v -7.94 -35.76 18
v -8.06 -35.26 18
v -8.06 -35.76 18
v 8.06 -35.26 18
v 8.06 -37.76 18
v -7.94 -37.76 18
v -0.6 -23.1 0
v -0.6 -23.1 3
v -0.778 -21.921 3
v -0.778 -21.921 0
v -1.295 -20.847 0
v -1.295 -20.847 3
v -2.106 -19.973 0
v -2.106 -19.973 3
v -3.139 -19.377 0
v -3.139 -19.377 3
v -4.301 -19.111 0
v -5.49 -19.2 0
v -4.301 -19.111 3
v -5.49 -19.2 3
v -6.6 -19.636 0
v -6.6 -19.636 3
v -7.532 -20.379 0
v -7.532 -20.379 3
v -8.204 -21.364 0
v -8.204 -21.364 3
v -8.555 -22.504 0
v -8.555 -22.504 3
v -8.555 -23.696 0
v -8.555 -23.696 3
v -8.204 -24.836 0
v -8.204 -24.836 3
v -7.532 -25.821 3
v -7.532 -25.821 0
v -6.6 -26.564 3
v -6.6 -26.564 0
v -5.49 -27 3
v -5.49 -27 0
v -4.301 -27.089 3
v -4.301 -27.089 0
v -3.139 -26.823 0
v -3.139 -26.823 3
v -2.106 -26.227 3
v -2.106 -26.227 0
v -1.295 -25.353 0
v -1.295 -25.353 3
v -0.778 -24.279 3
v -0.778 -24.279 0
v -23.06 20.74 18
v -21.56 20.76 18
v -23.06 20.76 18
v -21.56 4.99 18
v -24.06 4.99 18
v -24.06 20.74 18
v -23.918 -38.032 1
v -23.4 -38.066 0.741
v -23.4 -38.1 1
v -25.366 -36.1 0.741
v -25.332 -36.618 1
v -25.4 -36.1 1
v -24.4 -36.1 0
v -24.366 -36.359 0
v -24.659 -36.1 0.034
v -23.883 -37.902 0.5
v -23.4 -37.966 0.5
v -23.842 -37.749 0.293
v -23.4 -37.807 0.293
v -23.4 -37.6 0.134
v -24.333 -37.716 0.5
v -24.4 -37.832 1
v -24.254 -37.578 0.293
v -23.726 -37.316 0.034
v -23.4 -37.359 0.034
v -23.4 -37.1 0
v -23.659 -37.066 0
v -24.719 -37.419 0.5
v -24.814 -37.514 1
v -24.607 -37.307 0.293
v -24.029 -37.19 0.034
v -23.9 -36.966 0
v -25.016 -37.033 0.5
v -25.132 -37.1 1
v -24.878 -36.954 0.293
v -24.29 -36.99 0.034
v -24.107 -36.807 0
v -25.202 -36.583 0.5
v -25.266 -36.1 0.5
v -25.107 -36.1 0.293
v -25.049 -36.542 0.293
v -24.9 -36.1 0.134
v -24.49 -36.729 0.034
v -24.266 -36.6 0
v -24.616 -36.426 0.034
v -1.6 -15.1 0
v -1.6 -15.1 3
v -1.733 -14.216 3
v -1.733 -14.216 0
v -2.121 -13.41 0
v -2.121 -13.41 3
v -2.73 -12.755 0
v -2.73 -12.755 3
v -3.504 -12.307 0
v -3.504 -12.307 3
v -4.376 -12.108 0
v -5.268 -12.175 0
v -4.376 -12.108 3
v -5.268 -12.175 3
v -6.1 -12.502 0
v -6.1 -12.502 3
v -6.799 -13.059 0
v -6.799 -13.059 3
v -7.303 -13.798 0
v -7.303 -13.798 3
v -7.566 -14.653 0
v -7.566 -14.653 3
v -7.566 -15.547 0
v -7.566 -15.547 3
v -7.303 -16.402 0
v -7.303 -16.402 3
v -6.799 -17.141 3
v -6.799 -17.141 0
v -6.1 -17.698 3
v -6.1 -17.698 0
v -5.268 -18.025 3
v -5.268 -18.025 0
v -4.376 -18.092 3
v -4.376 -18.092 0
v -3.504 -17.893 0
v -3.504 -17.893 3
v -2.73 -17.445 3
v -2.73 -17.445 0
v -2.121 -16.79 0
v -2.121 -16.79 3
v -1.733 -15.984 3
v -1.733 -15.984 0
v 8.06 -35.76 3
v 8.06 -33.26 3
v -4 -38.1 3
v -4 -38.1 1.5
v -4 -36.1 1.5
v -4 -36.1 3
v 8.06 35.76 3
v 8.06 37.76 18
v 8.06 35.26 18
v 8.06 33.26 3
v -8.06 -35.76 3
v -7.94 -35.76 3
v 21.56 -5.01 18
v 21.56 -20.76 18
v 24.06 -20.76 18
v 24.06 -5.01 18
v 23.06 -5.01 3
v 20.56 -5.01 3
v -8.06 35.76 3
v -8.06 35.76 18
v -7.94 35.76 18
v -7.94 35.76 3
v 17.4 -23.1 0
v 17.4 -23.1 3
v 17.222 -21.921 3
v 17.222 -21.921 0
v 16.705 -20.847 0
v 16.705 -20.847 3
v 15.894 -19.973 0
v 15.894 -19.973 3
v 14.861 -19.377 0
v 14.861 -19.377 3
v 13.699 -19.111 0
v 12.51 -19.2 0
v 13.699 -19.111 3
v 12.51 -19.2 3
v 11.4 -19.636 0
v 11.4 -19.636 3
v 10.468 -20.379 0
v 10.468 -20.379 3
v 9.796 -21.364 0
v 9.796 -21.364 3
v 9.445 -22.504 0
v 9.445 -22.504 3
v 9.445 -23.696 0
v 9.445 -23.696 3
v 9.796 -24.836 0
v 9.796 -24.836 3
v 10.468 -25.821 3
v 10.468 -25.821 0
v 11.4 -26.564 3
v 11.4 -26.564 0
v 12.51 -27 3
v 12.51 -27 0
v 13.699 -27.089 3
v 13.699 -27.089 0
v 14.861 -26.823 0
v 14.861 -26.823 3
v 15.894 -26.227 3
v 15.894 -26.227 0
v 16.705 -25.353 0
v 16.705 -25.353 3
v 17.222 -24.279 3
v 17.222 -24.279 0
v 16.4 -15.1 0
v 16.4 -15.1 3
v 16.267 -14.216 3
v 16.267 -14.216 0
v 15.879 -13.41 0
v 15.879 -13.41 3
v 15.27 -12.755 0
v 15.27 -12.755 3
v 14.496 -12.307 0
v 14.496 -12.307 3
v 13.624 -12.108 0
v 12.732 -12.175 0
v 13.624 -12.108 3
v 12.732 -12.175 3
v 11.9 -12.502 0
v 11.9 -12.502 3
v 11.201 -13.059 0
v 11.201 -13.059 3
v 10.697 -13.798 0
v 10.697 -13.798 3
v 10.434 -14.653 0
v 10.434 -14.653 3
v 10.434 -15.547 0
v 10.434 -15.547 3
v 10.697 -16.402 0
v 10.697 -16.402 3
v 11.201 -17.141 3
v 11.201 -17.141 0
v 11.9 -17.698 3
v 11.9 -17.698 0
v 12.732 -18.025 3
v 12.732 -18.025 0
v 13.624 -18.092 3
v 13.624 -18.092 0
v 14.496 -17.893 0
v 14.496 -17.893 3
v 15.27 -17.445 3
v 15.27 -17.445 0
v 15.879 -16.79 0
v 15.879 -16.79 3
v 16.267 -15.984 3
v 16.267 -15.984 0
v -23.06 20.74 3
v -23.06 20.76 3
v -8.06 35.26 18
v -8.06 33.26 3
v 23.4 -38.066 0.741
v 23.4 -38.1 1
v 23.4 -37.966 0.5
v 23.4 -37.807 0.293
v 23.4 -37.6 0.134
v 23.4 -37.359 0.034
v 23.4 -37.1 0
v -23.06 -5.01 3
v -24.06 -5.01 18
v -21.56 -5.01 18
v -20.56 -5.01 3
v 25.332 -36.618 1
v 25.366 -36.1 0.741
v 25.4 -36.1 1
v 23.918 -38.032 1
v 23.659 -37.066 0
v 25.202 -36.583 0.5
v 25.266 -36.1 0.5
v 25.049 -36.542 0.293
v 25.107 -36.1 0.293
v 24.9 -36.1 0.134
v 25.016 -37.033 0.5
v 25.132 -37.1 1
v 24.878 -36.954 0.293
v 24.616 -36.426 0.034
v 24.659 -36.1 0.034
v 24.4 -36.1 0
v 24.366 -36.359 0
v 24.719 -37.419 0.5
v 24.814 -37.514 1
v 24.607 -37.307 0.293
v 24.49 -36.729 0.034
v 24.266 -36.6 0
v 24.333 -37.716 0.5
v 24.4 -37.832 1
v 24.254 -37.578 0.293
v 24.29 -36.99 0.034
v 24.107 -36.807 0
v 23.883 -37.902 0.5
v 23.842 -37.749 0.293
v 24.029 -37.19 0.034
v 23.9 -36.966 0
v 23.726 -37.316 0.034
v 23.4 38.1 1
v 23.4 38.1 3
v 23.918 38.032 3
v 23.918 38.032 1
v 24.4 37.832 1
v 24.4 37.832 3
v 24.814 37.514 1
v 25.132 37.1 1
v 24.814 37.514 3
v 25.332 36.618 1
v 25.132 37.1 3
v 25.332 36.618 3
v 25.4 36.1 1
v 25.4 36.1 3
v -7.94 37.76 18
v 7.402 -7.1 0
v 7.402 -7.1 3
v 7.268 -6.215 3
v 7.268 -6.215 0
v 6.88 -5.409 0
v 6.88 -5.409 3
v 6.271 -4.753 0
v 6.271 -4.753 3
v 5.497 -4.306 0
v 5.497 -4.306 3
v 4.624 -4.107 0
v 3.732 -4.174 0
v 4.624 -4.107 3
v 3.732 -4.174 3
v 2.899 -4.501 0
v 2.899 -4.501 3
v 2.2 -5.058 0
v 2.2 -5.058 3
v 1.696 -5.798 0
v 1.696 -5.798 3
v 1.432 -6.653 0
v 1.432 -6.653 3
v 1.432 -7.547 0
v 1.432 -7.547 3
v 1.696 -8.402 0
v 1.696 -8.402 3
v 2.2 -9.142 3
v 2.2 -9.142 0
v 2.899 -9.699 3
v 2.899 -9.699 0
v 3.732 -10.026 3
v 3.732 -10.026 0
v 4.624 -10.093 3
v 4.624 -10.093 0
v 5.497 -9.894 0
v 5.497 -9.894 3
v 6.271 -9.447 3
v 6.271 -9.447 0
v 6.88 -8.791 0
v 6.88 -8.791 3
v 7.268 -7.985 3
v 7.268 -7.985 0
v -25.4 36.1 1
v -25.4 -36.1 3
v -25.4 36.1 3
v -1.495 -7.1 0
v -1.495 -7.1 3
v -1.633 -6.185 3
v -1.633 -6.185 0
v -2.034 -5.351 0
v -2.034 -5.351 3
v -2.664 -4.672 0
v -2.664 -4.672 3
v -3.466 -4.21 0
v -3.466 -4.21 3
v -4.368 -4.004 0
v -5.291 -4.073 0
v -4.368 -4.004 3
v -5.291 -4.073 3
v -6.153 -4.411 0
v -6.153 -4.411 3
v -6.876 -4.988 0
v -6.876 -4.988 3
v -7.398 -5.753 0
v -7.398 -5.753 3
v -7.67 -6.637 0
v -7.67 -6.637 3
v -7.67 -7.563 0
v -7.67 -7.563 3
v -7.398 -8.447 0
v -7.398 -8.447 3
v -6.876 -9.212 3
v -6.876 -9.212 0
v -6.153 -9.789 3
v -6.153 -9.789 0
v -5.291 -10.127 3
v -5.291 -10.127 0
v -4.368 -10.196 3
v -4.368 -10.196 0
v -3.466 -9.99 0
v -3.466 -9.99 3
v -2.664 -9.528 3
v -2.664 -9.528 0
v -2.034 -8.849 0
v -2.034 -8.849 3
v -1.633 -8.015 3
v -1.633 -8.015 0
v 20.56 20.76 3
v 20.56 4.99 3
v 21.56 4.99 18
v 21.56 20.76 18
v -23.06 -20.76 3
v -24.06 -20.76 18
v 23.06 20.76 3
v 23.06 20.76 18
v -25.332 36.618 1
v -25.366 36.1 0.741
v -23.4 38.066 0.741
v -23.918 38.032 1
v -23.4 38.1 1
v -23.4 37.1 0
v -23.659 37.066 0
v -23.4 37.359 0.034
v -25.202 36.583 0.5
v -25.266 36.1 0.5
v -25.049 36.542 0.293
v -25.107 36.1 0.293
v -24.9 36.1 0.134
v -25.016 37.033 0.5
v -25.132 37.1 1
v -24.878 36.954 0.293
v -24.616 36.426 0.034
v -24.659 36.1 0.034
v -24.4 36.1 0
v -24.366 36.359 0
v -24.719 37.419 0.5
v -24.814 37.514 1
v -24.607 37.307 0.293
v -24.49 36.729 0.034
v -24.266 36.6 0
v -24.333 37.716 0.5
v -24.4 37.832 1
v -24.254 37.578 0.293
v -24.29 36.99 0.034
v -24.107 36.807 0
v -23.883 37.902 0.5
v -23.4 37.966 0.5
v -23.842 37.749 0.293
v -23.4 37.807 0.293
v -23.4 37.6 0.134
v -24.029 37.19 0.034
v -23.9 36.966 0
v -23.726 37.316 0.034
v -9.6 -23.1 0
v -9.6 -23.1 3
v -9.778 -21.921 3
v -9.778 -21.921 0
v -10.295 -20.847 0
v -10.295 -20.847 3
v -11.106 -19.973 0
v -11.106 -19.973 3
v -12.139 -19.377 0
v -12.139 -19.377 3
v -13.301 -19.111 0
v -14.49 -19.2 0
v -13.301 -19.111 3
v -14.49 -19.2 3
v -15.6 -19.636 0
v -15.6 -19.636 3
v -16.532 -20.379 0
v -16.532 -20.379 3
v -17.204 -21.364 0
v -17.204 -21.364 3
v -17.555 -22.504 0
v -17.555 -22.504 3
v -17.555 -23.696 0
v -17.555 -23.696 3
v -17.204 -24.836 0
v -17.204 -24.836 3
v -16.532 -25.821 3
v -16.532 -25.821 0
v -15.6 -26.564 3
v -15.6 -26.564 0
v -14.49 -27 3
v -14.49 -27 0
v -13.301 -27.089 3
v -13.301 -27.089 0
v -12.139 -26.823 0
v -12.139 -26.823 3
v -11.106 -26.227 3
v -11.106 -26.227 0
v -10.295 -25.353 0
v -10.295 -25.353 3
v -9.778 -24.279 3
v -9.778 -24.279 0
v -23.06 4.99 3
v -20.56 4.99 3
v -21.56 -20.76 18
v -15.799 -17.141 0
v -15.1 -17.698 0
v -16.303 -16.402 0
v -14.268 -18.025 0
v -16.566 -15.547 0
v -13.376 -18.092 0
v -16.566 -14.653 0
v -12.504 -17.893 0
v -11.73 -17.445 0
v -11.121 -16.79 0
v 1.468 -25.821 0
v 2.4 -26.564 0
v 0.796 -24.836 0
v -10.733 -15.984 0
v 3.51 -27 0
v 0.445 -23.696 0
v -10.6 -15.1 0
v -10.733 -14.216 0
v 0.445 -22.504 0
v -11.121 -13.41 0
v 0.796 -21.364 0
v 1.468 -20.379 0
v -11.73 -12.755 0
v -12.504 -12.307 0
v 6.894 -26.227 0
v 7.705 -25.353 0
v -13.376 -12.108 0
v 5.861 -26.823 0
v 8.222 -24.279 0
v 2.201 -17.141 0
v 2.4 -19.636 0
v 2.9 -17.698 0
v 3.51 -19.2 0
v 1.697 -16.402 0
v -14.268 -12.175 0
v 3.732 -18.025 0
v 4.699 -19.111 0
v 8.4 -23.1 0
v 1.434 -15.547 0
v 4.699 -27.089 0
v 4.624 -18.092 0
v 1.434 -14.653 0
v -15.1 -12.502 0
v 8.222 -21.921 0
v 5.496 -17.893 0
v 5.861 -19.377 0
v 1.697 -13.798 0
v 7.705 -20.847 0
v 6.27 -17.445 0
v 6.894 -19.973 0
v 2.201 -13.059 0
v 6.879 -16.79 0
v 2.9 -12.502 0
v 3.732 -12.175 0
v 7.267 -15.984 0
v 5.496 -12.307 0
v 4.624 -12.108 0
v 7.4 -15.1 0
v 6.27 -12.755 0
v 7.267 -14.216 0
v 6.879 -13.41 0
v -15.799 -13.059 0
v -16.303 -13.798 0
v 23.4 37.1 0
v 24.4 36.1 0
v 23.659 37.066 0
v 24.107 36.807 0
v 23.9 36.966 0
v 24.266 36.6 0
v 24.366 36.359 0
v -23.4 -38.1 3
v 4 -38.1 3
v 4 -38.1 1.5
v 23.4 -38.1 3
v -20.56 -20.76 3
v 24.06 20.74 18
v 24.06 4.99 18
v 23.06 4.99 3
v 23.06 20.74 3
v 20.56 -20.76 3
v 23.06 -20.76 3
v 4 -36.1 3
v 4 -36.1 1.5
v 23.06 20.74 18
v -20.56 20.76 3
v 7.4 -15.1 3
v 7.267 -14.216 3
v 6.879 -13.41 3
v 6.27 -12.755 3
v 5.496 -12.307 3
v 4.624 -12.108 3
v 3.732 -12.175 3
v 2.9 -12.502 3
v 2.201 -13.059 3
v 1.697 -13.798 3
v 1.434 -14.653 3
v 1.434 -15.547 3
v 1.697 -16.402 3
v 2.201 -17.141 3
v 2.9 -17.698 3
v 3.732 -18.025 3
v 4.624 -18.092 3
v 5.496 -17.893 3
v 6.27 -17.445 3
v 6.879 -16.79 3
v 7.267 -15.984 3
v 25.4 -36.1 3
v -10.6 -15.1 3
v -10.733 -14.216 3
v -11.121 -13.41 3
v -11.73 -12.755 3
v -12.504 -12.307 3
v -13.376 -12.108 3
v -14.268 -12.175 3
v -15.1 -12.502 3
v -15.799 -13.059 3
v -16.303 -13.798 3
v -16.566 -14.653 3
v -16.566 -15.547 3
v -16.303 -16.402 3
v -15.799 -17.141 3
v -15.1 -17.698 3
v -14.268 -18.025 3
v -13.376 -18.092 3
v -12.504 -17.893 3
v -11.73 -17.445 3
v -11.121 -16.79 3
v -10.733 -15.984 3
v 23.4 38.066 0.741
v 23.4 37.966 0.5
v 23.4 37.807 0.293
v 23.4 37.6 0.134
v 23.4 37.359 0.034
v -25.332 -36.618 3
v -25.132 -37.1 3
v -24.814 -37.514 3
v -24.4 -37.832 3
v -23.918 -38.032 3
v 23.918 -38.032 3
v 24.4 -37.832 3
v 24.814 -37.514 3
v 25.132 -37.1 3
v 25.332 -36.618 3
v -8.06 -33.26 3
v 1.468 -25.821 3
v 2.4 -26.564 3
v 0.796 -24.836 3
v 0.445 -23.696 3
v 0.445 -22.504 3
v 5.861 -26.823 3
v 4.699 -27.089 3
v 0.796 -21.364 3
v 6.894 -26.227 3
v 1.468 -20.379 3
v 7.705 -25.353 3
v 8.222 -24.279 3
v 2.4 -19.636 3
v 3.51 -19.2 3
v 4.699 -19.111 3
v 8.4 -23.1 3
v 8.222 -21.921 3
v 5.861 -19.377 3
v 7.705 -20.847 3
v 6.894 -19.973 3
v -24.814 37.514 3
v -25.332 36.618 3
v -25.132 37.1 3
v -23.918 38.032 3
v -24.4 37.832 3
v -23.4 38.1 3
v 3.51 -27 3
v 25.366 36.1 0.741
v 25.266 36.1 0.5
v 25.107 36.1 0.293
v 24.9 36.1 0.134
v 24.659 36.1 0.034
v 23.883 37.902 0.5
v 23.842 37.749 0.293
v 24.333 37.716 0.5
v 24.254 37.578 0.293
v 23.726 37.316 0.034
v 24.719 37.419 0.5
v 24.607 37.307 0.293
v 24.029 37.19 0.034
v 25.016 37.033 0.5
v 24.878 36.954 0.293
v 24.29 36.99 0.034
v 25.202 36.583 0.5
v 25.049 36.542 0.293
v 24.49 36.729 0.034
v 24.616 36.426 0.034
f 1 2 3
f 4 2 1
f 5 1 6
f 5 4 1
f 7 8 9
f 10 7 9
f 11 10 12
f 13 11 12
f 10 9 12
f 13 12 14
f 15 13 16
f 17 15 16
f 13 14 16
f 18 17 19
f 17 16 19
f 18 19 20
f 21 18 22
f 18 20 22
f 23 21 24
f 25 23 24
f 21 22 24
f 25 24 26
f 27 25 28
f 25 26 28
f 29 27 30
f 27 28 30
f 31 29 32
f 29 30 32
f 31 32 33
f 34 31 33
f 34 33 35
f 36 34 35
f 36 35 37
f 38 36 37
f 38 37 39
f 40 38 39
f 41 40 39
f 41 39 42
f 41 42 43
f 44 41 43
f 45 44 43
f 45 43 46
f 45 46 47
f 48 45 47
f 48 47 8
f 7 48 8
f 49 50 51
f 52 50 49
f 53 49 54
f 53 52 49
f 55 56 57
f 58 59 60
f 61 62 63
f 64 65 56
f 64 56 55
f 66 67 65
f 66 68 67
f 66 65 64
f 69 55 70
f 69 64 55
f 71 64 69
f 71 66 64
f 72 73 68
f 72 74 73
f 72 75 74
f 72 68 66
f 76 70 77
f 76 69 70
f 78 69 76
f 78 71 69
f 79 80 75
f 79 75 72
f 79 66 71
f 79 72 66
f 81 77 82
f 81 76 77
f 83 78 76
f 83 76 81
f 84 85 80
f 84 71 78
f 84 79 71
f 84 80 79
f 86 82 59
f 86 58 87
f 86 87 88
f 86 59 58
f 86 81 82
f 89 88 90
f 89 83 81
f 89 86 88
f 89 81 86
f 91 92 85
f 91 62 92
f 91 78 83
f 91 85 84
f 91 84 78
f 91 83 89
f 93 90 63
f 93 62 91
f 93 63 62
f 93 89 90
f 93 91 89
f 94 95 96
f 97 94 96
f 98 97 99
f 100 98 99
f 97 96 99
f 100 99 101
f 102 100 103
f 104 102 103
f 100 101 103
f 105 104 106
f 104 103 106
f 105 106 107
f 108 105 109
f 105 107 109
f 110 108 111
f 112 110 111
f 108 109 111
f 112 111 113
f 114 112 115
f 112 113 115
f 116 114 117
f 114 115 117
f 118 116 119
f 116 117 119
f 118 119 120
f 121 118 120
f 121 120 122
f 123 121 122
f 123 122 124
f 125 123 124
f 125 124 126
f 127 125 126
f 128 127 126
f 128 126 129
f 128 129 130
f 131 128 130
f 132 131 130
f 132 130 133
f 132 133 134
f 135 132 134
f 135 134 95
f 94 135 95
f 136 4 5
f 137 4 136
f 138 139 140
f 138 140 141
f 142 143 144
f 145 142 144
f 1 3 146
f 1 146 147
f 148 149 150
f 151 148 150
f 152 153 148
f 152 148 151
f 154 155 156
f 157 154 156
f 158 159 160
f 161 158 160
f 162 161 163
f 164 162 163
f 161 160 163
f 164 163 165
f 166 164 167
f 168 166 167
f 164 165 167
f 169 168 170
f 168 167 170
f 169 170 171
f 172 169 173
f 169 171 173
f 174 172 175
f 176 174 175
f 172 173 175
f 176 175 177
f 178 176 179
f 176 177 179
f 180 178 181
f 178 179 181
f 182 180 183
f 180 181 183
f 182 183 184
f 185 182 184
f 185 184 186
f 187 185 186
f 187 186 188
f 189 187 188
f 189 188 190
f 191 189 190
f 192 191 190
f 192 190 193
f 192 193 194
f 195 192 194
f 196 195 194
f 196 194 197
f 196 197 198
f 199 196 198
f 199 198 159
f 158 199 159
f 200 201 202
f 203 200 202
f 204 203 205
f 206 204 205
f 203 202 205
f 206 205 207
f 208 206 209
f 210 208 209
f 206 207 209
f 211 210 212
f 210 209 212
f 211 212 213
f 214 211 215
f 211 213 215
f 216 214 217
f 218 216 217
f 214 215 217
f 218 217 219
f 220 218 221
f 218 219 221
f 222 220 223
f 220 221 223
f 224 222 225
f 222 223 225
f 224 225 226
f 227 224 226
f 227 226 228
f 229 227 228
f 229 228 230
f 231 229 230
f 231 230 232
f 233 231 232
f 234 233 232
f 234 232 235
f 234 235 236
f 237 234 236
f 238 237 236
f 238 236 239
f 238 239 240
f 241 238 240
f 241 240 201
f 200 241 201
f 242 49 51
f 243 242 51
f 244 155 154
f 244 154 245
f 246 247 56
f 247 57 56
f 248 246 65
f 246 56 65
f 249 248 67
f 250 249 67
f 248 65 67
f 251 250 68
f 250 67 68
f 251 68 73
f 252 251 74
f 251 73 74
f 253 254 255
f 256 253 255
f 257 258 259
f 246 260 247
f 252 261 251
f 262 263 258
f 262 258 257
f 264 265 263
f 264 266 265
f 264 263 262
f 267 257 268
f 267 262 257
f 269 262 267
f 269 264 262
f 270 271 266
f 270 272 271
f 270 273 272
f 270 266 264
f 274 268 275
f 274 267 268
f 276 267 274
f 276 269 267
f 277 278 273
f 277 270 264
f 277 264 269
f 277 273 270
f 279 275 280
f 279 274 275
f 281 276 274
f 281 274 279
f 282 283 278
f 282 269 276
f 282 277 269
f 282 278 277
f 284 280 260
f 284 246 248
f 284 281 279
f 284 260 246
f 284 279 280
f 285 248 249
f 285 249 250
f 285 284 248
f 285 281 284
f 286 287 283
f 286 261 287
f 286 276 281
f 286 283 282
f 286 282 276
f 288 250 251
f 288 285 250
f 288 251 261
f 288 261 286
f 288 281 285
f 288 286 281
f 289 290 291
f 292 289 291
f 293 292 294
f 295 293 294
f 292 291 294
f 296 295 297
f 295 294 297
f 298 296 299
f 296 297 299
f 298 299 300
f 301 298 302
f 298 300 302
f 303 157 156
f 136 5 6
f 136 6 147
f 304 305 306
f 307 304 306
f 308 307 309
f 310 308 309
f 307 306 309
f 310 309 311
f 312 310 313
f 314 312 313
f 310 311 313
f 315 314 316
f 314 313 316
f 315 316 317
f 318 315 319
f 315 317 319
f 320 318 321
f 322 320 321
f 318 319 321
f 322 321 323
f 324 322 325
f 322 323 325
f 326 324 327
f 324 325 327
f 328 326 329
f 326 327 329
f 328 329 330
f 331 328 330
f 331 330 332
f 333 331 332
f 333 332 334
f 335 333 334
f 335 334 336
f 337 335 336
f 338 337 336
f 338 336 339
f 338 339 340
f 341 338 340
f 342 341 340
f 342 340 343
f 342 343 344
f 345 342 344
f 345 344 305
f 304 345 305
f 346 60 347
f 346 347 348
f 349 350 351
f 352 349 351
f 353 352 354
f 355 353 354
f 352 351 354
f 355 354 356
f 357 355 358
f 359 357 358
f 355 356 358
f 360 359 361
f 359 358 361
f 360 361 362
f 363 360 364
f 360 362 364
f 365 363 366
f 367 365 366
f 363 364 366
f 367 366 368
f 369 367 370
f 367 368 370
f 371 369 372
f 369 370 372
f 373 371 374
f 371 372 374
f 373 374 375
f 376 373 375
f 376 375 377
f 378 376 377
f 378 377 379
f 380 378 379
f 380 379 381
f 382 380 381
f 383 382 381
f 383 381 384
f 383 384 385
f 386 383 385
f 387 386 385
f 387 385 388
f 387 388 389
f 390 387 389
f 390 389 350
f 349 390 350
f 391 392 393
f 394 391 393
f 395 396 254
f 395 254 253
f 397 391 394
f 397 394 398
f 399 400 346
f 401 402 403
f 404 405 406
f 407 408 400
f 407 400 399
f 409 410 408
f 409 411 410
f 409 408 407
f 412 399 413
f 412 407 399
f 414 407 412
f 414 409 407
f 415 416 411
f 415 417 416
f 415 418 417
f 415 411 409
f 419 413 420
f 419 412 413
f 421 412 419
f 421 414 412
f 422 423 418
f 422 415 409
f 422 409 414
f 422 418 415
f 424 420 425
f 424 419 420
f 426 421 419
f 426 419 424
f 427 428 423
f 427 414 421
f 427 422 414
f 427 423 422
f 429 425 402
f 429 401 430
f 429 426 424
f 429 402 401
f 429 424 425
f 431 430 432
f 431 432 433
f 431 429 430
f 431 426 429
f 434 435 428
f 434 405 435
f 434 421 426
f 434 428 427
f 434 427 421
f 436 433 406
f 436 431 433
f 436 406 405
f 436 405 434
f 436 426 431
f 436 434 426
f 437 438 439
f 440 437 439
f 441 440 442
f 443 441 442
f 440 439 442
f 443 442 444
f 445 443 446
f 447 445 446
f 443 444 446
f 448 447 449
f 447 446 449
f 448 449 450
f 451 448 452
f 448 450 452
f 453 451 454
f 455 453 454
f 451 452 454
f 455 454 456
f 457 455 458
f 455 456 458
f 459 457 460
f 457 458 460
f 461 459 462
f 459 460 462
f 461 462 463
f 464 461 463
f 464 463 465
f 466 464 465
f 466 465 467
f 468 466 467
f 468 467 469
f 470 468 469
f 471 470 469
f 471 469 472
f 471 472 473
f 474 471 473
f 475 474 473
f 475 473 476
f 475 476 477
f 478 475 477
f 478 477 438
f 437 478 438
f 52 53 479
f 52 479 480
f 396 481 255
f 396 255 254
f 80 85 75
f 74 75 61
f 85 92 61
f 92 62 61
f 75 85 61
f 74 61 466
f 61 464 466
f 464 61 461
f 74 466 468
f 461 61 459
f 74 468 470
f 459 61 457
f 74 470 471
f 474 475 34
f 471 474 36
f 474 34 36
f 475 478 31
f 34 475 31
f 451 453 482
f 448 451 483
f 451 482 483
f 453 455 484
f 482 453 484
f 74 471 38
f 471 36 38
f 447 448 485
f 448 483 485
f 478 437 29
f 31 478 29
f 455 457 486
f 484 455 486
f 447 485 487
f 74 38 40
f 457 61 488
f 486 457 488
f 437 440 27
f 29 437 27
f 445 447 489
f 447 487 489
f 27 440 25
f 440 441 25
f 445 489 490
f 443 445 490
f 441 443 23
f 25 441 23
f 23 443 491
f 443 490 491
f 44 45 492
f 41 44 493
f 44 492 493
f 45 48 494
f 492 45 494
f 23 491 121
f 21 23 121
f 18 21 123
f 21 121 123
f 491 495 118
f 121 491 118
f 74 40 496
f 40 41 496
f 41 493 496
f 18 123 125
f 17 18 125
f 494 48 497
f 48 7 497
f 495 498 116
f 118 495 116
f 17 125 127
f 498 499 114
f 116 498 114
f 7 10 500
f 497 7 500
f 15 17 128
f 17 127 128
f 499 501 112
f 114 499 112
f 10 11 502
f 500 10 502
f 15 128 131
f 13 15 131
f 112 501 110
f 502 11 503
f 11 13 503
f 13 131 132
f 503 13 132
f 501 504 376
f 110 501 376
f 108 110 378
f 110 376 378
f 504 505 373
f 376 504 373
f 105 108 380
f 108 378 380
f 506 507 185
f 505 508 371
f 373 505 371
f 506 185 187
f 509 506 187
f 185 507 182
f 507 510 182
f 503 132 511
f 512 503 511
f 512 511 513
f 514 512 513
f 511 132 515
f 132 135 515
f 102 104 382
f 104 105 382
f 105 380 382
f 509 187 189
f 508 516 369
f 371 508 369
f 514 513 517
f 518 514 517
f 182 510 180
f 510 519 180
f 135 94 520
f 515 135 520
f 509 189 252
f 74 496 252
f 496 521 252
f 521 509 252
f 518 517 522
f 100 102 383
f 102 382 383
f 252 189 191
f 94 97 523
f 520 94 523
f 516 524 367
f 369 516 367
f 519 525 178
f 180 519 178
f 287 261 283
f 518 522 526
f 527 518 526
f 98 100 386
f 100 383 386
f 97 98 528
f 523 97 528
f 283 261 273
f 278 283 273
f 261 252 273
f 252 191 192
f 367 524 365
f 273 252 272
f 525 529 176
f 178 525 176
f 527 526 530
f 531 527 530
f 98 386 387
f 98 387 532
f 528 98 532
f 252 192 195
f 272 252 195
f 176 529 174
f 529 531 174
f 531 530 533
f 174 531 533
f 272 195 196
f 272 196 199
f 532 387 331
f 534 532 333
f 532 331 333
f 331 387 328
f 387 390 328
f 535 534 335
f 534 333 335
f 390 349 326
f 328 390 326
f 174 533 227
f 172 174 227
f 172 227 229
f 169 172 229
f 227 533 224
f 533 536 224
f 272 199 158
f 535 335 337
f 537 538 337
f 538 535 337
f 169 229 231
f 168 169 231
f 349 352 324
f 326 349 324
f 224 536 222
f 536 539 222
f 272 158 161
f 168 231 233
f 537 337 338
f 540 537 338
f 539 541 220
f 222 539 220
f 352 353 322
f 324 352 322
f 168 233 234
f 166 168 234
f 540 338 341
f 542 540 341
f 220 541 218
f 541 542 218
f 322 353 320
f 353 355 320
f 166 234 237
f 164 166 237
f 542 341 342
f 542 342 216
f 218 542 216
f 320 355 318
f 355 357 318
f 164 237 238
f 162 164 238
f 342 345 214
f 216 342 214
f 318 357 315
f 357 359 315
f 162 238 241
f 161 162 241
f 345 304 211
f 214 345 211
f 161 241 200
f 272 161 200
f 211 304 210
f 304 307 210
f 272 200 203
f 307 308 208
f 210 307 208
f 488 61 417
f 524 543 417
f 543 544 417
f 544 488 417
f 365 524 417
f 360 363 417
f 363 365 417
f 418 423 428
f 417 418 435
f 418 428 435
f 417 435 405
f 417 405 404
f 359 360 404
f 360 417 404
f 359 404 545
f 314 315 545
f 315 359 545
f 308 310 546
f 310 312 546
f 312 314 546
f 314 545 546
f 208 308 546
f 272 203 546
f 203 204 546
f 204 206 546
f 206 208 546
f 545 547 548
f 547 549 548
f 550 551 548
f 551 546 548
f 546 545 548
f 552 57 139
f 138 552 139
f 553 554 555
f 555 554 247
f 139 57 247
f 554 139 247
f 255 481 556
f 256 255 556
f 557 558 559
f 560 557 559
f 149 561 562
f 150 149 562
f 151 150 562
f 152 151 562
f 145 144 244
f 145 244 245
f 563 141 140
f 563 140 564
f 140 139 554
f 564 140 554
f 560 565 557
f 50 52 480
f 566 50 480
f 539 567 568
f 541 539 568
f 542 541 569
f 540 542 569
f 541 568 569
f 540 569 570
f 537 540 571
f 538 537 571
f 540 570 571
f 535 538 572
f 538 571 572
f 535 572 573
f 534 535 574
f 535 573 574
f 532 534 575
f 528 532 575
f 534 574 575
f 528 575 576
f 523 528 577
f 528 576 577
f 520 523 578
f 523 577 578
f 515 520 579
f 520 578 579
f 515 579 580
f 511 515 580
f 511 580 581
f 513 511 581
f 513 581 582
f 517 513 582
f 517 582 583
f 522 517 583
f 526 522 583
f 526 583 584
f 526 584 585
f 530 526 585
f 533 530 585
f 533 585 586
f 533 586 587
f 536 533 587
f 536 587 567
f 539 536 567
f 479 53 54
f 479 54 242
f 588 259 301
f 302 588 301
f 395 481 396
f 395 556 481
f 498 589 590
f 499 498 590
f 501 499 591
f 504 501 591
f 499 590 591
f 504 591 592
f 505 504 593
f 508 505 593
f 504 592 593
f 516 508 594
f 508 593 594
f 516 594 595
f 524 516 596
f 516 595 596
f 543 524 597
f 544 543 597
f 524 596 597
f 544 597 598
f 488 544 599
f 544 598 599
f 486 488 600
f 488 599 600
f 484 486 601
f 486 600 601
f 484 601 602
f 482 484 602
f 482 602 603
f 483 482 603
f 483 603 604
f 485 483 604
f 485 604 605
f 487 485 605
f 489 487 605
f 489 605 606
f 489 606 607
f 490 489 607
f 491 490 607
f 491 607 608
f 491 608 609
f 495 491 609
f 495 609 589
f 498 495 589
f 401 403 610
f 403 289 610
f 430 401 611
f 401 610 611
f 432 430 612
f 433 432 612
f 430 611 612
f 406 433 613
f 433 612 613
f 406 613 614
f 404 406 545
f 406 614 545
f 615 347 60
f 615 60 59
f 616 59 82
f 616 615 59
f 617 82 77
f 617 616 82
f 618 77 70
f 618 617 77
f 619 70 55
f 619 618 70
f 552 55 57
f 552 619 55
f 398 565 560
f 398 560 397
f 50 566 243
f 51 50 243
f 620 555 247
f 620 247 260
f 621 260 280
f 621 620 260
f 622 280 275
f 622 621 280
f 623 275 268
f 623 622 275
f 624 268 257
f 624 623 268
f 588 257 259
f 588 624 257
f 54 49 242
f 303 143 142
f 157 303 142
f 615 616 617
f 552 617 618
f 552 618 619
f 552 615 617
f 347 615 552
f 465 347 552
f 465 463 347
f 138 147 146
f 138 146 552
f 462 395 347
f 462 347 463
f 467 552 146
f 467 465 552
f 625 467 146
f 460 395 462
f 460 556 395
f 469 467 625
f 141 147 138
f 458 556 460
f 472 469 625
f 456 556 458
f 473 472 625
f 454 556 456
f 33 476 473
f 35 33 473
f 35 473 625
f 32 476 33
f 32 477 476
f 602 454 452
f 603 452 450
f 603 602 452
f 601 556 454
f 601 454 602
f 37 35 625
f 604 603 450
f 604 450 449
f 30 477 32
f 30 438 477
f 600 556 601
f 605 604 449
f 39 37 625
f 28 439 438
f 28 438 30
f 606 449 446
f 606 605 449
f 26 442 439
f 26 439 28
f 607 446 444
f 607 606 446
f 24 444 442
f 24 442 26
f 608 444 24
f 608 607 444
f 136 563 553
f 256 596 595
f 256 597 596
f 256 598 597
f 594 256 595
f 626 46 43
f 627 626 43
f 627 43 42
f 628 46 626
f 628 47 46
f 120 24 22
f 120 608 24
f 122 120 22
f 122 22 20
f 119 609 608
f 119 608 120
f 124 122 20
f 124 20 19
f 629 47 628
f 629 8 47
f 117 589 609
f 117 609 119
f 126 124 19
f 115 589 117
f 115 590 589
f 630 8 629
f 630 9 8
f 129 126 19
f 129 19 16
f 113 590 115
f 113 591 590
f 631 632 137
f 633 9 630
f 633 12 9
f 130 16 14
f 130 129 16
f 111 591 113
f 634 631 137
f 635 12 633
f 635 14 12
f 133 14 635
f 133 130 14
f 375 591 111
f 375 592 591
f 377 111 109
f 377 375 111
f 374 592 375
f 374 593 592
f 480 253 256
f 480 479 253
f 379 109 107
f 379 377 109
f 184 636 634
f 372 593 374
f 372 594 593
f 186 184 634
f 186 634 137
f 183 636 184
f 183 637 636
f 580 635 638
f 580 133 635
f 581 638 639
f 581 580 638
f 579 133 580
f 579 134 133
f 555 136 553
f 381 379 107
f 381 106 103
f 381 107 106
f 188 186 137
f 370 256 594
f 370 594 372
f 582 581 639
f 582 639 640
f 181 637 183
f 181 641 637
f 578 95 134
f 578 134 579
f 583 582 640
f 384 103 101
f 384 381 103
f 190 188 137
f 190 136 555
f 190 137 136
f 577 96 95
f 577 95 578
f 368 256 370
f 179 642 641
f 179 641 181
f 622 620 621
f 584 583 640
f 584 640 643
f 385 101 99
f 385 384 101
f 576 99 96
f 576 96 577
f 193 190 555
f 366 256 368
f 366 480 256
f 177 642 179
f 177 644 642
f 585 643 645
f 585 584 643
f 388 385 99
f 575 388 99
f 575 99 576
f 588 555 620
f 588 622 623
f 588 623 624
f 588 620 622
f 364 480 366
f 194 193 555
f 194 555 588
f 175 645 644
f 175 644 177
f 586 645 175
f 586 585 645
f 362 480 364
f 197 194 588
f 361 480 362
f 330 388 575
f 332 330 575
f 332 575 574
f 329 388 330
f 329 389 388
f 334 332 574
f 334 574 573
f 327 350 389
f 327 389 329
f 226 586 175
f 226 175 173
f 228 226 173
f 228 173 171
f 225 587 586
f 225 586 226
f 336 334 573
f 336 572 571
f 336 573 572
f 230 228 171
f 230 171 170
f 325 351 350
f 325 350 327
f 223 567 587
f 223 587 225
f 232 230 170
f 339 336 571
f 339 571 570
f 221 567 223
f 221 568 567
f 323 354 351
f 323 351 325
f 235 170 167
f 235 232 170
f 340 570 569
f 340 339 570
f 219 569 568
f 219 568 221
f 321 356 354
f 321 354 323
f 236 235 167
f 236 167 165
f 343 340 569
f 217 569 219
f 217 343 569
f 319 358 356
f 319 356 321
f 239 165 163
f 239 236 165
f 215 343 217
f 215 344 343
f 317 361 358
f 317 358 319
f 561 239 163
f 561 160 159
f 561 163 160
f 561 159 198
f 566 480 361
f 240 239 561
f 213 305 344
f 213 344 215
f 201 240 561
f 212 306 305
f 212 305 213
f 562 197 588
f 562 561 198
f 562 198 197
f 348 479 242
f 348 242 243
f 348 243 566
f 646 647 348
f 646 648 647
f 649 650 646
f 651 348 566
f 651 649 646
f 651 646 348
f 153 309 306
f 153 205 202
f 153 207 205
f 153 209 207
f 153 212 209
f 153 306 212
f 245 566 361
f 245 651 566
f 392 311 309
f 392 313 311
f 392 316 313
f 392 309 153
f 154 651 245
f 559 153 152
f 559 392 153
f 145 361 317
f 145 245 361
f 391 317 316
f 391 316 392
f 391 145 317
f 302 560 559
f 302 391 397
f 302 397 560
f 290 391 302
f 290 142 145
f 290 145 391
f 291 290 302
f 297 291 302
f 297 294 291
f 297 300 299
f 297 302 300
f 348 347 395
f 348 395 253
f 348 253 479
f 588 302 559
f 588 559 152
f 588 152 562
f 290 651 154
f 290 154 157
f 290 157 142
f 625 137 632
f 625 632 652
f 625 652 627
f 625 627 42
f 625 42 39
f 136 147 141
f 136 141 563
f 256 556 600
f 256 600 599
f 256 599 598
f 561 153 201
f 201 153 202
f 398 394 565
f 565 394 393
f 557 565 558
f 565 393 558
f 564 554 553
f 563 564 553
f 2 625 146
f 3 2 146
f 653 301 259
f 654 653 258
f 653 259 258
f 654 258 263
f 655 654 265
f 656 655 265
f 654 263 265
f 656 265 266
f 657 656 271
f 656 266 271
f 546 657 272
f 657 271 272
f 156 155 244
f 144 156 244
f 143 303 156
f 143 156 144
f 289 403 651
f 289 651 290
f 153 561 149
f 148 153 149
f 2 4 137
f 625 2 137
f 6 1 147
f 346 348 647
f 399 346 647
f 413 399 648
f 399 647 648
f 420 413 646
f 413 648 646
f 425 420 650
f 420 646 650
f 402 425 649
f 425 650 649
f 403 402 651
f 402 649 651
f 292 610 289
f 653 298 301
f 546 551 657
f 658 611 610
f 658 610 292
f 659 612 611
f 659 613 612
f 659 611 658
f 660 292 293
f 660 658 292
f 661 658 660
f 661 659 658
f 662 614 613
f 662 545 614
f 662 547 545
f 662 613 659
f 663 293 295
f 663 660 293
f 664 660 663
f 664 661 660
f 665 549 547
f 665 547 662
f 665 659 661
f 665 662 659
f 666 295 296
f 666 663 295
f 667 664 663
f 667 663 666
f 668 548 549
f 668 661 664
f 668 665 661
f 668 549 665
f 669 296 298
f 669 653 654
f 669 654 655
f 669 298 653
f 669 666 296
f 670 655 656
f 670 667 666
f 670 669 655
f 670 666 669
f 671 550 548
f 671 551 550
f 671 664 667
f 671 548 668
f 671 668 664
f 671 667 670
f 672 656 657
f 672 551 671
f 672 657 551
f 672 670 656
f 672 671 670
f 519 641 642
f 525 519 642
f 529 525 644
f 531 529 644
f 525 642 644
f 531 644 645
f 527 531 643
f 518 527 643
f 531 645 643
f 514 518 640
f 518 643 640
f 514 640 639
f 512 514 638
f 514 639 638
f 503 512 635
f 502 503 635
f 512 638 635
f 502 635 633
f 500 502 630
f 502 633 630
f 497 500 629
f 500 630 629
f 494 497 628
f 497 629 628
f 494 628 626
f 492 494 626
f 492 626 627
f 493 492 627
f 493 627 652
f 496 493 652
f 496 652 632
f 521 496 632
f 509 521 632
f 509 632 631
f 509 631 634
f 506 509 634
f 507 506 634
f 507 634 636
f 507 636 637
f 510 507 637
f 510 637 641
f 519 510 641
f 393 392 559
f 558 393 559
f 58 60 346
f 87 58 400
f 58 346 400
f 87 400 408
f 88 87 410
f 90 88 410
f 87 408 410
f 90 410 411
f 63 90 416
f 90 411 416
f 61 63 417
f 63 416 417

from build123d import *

# Parameters (mm, degrees)
CROQUIS1_W              = 50.8
CROQUIS1_H              = 76.2
SALIENTE_EXTRUIR1_DEPTH = 18
CROQUIS2_W              = 50.8
CROQUIS2_H              = 76.2
CROQUIS2_W_2            = 46.12
CROQUIS2_H_2            = 71.52
CROQUIS2_W_3            = 38.8
CROQUIS2_H_3            = 64.2
CORTAR_EXTRUIR1_DEPTH   = 15
CORTAR_EXTRUIR8_DEPTH   = 15
SALIENTE_EXTRUIR3_DEPTH = 41.5
CORTAR_EXTRUIR9_DEPTH   = 51.5
CORTAR_EXTRUIR10_DEPTH  = 51.5
SALIENTE_EXTRUIR4_DEPTH = 16
CORTAR_EXTRUIR11_DEPTH  = 16.5
REDONDEO3_R             = 2
REDONDEO4_R             = 1
CROQUIS15_W             = 48.12
CROQUIS15_H             = 10
CORTAR_EXTRUIR12_DEPTH  = 15
CROQUIS16_W             = 8
CROQUIS16_H             = 1.5
CORTAR_EXTRUIR13_DEPTH  = 2
CROQUIS17_R             = 4
CROQUIS17_R_2           = 3
CROQUIS17_R_3           = 3.105135185
CROQUIS17_R_4           = 3.001630679
CORTAR_EXTRUIR14_DEPTH  = 10


with BuildPart() as part:
    # Croquis1 → Saliente-Extruir1 (new body)
    with BuildSketch(Plane.XY):
        Rectangle(CROQUIS1_W, CROQUIS1_H)
    extrude(amount=SALIENTE_EXTRUIR1_DEPTH)

    # Croquis2 → Cortar-Extruir1 (cut)
    # profile 1 of 2: a face of its own
    with BuildSketch(Plane.XY.offset(18)):
        Rectangle(CROQUIS2_W, CROQUIS2_H)
        Rectangle(CROQUIS2_W_2, CROQUIS2_H_2, mode=Mode.SUBTRACT)
    # profile 2 of 2: a face of its own
    with BuildSketch(Plane.XY.offset(18)):
        Rectangle(CROQUIS2_W_3, CROQUIS2_H_3)
    extrude(amount=-CORTAR_EXTRUIR1_DEPTH, mode=Mode.SUBTRACT)

    # Croquis6 → Cortar-Extruir8 (cut)
    with BuildSketch(Plane.XY.offset(18)):
        Polygon((-23.06, 35.76), (-8.06, 35.76), (-8.06, 32.1), (-19.4, 32.1), (-19.4, 20.76), (-23.06, 20.76), align=None)
        Polygon((23.06, 35.76), (8.06, 35.76), (8.06, 32.1), (19.4, 32.1), (19.4, 20.76), (23.06, 20.76), align=None)
        Polygon((-23.06, -35.76), (-23.06, -20.76), (-19.4, -20.76), (-19.4, -32.1), (-8.06, -32.1), (-8.06, -35.76), align=None)
        Polygon((23.06, -35.76), (8.06, -35.76), (8.06, -32.1), (19.4, -32.1), (19.4, -20.76), (23.06, -20.76), align=None)
    extrude(amount=-CORTAR_EXTRUIR8_DEPTH, mode=Mode.SUBTRACT)

    # Croquis10 → Saliente-Extruir3 (add)
    with BuildSketch(Plane(origin=(0, -20.76, 0), x_dir=(-1, 0, 0), z_dir=(0, -1, 0))):
        Polygon((23.06, -18), (24.06, -18), (23.06, -3), align=None)
        Polygon((-23.06, -18), (-24.06, -18), (-23.06, -3), align=None)
    extrude(amount=-SALIENTE_EXTRUIR3_DEPTH)

    # Croquis11 → Cortar-Extruir9 (cut)
    with BuildSketch(Plane.XZ.offset(20.76)):
        Polygon((-19.4, 18), (-21.56, 18), (-20.56, 3), (-19.4, 3), align=None)
    extrude(amount=-CORTAR_EXTRUIR9_DEPTH, mode=Mode.SUBTRACT)

    # Croquis12 → Cortar-Extruir10 (cut)
    with BuildSketch(Plane.XZ.offset(20.76)):
        Polygon((19.4, 18), (19.4, 3), (20.56, 3), (21.56, 18), align=None)
    extrude(amount=-CORTAR_EXTRUIR10_DEPTH, mode=Mode.SUBTRACT)

    # Croquis13 → Saliente-Extruir4 (add)
    with BuildSketch(Plane(origin=(8.06, 0, 0), x_dir=(0, 0, -1), z_dir=(1, 0, 0))):
        Polygon((-18, -35.76), (-18, -37.76), (-3, -35.76), align=None)
        Polygon((-18, 35.76), (-18, 37.76), (-3, 35.76), align=None)
    extrude(amount=-SALIENTE_EXTRUIR4_DEPTH)

    # Croquis14 → Cortar-Extruir11 (cut)
    with BuildSketch(Plane(origin=(8.06, 0, 0), x_dir=(0, 0, -1), z_dir=(1, 0, 0))):
        Polygon((-3, -32.1), (-18, -32.1), (-18, -35.26), (-3, -33.26), align=None)
        Polygon((-18, 32.1), (-18, 35.26), (-3, 33.26), (-3, 32.1), align=None)
    extrude(amount=-CORTAR_EXTRUIR11_DEPTH, mode=Mode.SUBTRACT)

    # Redondeo3
    redondeo3_edges = [part.edges().sort_by_distance(p)[0] for p in [
        (-25.4, 38.1, 1.5),
        (25.4, 38.1, 1.5),
        (25.4, -38.1, 1.5),
        (-25.4, -38.1, 1.5),
    ]]
    fillet(redondeo3_edges, radius=REDONDEO3_R)

    # Redondeo4
    redondeo4_edges = [part.edges().sort_by_distance(p)[0] for p in [
        (0, 38.1, 0),
        (-25.4, 0, 0),
        (25.4, 0, 0),
        (0, -38.1, 0),
        (24.814213562, -37.514213562, 0),
        (-24.814213562, -37.514213562, 0),
        (-24.814213562, 37.514213562, 0),
        (24.814213562, 37.514213562, 0),
    ]]
    fillet(redondeo4_edges, radius=REDONDEO4_R)

    # Croquis15 → Cortar-Extruir12 (cut)
    with BuildSketch(Plane.XY.offset(18)):
        with Locations((0, -0.01)):
            Rectangle(CROQUIS15_W, CROQUIS15_H)
    extrude(amount=-CORTAR_EXTRUIR12_DEPTH, mode=Mode.SUBTRACT)

    # Croquis16 → Cortar-Extruir13 (cut)
    with BuildSketch(Plane.XZ.offset(38.1)):
        with Locations((0, 2.25)):
            Rectangle(CROQUIS16_W, CROQUIS16_H)
    extrude(amount=-CORTAR_EXTRUIR13_DEPTH, mode=Mode.SUBTRACT)

    # Croquis17 → Cortar-Extruir14 (cut)
    with BuildSketch(Plane.XY.offset(3)):
        with Locations((13.4, -23.1)):
            Circle(CROQUIS17_R)
        with Locations((13.4, -15.1)):
            Circle(CROQUIS17_R_2)
        with Locations((4.4, -23.1)):
            Circle(CROQUIS17_R)
        with Locations((-4.6, -23.1)):
            Circle(CROQUIS17_R)
        with Locations((-13.6, -23.1)):
            Circle(CROQUIS17_R)
        with Locations((4.4, -15.1)):
            Circle(CROQUIS17_R_2)
        with Locations((-4.6, -15.1)):
            Circle(CROQUIS17_R_2)
        with Locations((-13.6, -15.1)):
            Circle(CROQUIS17_R_2)
        with Locations((-4.6, -7.1)):
            Circle(CROQUIS17_R_3)
        with Locations((4.4, -7.1)):
            Circle(CROQUIS17_R_4)
    extrude(amount=-CORTAR_EXTRUIR14_DEPTH, mode=Mode.SUBTRACT)


solid = part.part
